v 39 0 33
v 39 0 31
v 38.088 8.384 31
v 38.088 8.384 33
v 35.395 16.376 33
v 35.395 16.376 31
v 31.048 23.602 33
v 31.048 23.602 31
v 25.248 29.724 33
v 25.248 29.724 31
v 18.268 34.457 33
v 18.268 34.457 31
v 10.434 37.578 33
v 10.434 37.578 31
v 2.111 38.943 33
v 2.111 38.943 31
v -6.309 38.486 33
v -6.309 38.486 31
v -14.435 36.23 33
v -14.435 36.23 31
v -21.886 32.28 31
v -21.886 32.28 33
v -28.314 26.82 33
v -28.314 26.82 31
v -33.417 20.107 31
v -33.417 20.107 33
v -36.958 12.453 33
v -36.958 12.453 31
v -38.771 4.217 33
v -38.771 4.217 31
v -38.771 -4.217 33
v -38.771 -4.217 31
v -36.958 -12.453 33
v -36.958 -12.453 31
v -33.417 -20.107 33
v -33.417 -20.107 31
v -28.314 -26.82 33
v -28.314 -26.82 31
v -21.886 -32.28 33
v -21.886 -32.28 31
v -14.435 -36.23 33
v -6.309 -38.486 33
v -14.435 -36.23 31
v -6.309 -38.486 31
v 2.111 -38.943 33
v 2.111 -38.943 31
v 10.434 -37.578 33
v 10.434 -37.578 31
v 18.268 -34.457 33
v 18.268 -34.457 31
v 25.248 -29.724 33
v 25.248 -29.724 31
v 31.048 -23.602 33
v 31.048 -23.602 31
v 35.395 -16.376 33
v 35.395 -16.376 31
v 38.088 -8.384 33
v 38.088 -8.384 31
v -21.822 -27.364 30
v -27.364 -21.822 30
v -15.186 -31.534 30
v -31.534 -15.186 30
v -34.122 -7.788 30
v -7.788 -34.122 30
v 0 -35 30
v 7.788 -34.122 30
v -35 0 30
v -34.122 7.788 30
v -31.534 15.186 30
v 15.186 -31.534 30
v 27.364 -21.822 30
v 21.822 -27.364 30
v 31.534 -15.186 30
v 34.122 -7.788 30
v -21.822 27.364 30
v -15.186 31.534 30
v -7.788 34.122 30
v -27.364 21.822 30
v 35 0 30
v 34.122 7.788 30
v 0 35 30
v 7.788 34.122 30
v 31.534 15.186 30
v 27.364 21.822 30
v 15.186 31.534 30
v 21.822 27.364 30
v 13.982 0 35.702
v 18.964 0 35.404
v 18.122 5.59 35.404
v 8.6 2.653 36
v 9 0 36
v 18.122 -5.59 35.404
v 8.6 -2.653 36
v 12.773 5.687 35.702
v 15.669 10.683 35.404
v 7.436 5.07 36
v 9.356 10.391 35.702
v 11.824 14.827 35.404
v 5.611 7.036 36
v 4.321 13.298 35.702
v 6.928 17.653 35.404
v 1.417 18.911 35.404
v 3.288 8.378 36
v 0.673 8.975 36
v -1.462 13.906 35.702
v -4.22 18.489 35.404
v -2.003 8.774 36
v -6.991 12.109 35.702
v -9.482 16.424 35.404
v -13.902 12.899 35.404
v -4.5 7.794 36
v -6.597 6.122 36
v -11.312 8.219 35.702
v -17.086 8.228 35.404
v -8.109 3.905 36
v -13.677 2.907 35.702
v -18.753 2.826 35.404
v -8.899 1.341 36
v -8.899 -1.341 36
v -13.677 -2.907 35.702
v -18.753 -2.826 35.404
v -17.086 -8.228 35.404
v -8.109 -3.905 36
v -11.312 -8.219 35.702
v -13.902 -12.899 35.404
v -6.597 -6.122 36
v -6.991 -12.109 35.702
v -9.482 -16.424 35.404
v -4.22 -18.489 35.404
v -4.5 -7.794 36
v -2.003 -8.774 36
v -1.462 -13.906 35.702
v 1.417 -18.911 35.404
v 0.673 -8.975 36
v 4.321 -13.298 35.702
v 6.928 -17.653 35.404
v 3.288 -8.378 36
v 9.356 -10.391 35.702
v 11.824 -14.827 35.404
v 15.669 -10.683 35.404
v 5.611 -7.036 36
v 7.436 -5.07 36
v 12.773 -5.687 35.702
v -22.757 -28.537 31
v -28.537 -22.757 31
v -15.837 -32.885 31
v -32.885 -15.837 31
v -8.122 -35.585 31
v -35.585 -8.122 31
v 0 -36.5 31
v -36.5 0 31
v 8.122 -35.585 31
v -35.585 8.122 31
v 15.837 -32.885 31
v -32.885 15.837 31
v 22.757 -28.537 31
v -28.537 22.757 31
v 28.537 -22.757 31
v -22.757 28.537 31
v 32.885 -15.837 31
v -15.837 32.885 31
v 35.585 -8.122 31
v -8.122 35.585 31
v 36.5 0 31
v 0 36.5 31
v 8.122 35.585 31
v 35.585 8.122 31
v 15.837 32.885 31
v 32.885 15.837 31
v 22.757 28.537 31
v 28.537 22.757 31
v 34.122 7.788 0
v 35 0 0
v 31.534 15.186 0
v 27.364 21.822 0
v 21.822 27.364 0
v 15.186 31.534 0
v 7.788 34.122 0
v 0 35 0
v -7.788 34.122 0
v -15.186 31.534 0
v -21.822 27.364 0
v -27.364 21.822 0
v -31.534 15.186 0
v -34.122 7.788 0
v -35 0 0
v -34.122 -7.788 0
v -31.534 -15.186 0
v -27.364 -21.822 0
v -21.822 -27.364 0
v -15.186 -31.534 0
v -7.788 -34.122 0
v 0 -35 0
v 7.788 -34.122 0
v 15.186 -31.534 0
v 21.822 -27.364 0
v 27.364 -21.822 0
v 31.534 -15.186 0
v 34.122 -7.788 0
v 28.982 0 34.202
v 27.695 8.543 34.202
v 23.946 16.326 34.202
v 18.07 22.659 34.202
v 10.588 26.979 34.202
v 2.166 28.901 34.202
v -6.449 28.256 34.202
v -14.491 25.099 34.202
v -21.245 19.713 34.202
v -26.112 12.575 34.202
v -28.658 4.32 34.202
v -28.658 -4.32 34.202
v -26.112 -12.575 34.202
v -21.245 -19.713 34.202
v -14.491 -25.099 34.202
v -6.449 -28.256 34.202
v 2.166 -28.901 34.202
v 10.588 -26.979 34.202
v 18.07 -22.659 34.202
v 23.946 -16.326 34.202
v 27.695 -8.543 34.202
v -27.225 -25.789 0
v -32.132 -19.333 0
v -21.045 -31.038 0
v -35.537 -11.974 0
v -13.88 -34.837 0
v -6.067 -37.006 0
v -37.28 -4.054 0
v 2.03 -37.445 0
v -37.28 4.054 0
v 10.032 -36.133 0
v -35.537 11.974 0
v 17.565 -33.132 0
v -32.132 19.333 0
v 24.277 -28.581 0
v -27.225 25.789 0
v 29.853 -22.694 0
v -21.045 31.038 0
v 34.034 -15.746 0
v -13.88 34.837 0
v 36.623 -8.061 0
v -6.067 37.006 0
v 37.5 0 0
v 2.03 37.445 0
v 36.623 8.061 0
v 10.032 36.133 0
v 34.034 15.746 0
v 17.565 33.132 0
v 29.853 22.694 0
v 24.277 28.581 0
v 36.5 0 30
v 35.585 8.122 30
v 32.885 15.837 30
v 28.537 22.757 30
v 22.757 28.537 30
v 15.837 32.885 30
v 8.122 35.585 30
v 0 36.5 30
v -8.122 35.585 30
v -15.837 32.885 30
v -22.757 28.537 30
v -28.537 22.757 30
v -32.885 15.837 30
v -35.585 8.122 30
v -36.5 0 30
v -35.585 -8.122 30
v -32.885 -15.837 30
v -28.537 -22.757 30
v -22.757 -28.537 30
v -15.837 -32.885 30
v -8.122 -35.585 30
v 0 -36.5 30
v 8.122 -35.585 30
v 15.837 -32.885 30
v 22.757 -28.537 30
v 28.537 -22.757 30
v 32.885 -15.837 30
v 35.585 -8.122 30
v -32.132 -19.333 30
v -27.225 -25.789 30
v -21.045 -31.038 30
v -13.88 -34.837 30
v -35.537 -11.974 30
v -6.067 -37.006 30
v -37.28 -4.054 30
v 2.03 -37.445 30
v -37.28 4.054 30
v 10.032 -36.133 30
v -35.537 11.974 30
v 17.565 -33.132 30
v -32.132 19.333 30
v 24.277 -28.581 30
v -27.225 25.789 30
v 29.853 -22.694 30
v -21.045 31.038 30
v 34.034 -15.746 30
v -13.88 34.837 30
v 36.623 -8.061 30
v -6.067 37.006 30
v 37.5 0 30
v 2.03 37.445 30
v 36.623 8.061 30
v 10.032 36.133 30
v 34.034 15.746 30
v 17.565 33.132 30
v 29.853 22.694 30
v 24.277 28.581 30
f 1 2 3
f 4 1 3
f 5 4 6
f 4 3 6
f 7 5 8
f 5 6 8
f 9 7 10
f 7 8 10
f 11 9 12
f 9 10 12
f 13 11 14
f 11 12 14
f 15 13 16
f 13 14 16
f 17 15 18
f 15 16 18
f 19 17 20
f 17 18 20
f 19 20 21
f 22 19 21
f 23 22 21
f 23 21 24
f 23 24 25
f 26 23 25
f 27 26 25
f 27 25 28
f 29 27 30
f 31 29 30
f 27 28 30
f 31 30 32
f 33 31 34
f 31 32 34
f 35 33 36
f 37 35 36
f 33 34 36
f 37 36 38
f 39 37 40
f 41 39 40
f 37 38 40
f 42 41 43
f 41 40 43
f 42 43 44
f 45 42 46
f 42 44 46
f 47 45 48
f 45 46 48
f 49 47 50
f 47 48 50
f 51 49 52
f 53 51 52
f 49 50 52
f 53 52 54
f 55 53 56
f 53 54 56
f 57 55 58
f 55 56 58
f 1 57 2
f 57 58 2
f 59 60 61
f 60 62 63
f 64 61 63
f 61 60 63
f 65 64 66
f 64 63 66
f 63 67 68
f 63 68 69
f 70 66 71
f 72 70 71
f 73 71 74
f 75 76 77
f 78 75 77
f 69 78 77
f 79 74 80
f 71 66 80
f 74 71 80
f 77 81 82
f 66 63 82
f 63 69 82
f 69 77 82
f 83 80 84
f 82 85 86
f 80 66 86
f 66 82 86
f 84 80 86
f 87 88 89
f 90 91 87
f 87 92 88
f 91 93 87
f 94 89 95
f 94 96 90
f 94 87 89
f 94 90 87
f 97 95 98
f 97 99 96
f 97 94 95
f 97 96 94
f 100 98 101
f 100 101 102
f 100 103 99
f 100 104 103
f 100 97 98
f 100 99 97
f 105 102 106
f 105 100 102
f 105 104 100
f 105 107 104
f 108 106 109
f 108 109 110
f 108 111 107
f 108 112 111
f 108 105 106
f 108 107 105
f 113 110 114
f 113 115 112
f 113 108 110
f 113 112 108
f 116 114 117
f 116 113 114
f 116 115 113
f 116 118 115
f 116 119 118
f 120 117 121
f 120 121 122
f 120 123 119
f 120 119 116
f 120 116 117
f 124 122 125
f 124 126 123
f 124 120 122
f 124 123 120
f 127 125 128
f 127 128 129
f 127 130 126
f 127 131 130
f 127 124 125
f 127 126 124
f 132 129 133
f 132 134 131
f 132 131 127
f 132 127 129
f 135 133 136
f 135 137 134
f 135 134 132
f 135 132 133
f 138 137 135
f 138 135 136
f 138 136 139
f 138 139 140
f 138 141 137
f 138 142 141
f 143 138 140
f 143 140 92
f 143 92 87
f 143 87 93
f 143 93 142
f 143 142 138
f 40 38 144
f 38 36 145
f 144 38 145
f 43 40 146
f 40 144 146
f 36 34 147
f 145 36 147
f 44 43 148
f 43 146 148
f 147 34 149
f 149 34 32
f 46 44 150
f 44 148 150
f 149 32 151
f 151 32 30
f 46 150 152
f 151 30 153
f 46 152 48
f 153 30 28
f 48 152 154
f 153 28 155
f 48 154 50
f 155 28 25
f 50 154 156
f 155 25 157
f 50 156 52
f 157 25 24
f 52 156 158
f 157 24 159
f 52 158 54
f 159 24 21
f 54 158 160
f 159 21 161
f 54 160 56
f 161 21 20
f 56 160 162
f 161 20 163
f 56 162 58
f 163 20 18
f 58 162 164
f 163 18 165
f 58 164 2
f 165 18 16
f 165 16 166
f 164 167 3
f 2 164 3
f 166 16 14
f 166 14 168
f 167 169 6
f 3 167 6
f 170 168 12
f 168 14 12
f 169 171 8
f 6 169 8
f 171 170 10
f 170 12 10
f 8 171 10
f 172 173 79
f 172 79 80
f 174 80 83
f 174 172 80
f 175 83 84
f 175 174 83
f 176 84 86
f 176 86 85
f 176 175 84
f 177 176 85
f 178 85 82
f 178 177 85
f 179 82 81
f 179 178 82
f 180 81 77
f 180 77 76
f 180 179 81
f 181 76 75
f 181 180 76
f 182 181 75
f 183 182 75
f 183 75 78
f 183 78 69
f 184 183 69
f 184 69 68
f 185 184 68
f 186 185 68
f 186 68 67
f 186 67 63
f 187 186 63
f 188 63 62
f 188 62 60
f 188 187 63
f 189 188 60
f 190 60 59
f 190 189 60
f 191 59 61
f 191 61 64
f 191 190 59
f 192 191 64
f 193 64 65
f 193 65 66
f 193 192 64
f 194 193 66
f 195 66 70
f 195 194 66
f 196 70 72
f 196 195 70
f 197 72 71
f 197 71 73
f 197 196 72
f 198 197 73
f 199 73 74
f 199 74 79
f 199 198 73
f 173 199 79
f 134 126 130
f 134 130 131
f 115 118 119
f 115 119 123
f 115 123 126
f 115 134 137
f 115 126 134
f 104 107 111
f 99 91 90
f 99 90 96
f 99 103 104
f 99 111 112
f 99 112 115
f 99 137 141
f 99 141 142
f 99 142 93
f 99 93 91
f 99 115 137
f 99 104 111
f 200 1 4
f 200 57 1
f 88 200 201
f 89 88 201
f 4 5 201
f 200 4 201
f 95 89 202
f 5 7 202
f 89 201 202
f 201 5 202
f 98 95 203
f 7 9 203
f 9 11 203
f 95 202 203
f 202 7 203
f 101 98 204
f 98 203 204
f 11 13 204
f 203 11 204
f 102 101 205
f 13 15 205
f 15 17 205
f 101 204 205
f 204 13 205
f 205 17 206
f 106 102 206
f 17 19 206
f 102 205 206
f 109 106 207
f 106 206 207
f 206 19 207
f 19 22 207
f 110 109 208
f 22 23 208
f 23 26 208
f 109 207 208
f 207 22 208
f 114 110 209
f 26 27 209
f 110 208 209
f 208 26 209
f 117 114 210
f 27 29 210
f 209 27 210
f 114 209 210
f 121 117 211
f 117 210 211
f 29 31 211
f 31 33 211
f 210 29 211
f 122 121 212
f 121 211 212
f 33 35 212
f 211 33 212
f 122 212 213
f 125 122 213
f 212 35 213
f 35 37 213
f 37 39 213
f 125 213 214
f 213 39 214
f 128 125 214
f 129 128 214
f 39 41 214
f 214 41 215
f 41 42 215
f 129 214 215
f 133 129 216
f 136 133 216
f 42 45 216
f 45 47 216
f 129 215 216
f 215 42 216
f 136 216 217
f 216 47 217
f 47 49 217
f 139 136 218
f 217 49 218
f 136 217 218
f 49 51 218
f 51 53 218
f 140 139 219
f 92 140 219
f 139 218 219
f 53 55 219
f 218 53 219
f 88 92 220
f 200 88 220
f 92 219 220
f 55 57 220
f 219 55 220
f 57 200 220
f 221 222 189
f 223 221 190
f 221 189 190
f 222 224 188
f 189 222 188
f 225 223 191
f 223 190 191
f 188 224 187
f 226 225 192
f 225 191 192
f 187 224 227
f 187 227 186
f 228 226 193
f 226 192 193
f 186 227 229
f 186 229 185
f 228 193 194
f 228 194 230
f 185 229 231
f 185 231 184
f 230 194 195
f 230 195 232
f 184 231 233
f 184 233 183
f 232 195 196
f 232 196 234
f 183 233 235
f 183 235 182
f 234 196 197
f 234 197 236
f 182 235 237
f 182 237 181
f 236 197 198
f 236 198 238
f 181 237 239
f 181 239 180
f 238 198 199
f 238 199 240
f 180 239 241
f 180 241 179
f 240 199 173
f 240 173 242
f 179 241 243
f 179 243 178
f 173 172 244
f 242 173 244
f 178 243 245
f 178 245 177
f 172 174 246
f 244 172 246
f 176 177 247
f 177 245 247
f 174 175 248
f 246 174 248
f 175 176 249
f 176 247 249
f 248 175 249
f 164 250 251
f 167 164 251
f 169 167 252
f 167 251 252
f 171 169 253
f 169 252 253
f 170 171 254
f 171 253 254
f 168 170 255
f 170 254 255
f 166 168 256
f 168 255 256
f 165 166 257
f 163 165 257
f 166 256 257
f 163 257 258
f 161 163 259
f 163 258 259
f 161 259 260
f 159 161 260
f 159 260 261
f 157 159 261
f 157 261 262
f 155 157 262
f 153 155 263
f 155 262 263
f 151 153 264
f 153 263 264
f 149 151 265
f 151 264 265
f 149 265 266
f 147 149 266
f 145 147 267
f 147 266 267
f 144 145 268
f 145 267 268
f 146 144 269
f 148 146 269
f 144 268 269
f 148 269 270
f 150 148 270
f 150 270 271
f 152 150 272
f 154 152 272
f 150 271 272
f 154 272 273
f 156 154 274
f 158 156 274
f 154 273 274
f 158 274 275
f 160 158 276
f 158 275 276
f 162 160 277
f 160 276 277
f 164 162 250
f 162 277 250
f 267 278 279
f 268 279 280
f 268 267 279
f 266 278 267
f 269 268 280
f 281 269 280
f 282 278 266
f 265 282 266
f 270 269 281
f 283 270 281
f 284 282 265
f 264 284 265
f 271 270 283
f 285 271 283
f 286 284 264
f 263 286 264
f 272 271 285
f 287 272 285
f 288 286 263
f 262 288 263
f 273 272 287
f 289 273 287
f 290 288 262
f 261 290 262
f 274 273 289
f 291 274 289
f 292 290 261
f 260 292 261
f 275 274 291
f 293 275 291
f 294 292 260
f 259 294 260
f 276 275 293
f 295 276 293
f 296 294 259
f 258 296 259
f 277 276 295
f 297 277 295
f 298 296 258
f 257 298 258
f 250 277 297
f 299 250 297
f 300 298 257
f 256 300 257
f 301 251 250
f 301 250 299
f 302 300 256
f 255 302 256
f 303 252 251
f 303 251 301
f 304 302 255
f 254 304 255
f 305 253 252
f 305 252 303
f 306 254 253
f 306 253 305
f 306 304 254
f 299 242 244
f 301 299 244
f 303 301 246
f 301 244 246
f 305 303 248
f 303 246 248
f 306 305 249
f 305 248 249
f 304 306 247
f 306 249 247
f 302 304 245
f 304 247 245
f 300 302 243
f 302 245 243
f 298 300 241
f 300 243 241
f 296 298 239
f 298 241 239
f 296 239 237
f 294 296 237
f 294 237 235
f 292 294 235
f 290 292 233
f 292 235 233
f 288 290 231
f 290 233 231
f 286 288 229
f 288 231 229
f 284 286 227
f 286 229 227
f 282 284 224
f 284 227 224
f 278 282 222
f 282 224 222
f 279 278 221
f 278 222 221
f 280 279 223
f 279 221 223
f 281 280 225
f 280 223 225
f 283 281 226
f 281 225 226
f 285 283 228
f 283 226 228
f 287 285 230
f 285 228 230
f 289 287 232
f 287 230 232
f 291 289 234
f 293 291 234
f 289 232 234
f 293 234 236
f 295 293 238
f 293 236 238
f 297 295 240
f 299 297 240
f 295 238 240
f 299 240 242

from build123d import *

# Parameters (mm, degrees)
F0_R     = 37.5
F0_R_2   = 35
F1_DEPTH = 30
F2_R     = 36.5
F2_R_2   = 35
F3_DEPTH = 1
F4_R     = 39
F4_R_2   = 36.5
F5_DEPTH = 5
F6_SIZE2 = 3
F6_SIZE  = 25
F7_SIZE  = 5


with BuildPart() as f1:
    # F0 (on Top) → F1 (new body)
    with BuildSketch(Plane.XY):
        Circle(F0_R)
        Circle(F0_R_2, mode=Mode.SUBTRACT)
    extrude(amount=F1_DEPTH)

    # F2 (on face) → F3 (join)
    with BuildSketch(Plane.XY.offset(30)):
        Circle(F2_R)
        Circle(F2_R_2, mode=Mode.SUBTRACT)
        Circle(F2_R_2)
    extrude(amount=F3_DEPTH)

    # F4 (on face) → F5 (join)
    with BuildSketch(Plane.XY.offset(31)):
        Circle(F4_R)
        Circle(F4_R_2, mode=Mode.SUBTRACT)
        Circle(F4_R_2)
    extrude(amount=F5_DEPTH)

    # F6
    f6_edges = [f1.edges().sort_by_distance(p)[0] for p in [
        (-39, 0, 36),
    ]]
    f6_side = f1.faces().sort_by_distance((0, 0, 36))[0]
    chamfer(f6_edges, length=F6_SIZE, length2=F6_SIZE2, reference=f6_side)

    # F7
    f7_edges = [f1.edges().sort_by_distance(p)[0] for p in [
        (-14, 0, 36),
    ]]
    chamfer(f7_edges, length=F7_SIZE)


solid = f1.part
